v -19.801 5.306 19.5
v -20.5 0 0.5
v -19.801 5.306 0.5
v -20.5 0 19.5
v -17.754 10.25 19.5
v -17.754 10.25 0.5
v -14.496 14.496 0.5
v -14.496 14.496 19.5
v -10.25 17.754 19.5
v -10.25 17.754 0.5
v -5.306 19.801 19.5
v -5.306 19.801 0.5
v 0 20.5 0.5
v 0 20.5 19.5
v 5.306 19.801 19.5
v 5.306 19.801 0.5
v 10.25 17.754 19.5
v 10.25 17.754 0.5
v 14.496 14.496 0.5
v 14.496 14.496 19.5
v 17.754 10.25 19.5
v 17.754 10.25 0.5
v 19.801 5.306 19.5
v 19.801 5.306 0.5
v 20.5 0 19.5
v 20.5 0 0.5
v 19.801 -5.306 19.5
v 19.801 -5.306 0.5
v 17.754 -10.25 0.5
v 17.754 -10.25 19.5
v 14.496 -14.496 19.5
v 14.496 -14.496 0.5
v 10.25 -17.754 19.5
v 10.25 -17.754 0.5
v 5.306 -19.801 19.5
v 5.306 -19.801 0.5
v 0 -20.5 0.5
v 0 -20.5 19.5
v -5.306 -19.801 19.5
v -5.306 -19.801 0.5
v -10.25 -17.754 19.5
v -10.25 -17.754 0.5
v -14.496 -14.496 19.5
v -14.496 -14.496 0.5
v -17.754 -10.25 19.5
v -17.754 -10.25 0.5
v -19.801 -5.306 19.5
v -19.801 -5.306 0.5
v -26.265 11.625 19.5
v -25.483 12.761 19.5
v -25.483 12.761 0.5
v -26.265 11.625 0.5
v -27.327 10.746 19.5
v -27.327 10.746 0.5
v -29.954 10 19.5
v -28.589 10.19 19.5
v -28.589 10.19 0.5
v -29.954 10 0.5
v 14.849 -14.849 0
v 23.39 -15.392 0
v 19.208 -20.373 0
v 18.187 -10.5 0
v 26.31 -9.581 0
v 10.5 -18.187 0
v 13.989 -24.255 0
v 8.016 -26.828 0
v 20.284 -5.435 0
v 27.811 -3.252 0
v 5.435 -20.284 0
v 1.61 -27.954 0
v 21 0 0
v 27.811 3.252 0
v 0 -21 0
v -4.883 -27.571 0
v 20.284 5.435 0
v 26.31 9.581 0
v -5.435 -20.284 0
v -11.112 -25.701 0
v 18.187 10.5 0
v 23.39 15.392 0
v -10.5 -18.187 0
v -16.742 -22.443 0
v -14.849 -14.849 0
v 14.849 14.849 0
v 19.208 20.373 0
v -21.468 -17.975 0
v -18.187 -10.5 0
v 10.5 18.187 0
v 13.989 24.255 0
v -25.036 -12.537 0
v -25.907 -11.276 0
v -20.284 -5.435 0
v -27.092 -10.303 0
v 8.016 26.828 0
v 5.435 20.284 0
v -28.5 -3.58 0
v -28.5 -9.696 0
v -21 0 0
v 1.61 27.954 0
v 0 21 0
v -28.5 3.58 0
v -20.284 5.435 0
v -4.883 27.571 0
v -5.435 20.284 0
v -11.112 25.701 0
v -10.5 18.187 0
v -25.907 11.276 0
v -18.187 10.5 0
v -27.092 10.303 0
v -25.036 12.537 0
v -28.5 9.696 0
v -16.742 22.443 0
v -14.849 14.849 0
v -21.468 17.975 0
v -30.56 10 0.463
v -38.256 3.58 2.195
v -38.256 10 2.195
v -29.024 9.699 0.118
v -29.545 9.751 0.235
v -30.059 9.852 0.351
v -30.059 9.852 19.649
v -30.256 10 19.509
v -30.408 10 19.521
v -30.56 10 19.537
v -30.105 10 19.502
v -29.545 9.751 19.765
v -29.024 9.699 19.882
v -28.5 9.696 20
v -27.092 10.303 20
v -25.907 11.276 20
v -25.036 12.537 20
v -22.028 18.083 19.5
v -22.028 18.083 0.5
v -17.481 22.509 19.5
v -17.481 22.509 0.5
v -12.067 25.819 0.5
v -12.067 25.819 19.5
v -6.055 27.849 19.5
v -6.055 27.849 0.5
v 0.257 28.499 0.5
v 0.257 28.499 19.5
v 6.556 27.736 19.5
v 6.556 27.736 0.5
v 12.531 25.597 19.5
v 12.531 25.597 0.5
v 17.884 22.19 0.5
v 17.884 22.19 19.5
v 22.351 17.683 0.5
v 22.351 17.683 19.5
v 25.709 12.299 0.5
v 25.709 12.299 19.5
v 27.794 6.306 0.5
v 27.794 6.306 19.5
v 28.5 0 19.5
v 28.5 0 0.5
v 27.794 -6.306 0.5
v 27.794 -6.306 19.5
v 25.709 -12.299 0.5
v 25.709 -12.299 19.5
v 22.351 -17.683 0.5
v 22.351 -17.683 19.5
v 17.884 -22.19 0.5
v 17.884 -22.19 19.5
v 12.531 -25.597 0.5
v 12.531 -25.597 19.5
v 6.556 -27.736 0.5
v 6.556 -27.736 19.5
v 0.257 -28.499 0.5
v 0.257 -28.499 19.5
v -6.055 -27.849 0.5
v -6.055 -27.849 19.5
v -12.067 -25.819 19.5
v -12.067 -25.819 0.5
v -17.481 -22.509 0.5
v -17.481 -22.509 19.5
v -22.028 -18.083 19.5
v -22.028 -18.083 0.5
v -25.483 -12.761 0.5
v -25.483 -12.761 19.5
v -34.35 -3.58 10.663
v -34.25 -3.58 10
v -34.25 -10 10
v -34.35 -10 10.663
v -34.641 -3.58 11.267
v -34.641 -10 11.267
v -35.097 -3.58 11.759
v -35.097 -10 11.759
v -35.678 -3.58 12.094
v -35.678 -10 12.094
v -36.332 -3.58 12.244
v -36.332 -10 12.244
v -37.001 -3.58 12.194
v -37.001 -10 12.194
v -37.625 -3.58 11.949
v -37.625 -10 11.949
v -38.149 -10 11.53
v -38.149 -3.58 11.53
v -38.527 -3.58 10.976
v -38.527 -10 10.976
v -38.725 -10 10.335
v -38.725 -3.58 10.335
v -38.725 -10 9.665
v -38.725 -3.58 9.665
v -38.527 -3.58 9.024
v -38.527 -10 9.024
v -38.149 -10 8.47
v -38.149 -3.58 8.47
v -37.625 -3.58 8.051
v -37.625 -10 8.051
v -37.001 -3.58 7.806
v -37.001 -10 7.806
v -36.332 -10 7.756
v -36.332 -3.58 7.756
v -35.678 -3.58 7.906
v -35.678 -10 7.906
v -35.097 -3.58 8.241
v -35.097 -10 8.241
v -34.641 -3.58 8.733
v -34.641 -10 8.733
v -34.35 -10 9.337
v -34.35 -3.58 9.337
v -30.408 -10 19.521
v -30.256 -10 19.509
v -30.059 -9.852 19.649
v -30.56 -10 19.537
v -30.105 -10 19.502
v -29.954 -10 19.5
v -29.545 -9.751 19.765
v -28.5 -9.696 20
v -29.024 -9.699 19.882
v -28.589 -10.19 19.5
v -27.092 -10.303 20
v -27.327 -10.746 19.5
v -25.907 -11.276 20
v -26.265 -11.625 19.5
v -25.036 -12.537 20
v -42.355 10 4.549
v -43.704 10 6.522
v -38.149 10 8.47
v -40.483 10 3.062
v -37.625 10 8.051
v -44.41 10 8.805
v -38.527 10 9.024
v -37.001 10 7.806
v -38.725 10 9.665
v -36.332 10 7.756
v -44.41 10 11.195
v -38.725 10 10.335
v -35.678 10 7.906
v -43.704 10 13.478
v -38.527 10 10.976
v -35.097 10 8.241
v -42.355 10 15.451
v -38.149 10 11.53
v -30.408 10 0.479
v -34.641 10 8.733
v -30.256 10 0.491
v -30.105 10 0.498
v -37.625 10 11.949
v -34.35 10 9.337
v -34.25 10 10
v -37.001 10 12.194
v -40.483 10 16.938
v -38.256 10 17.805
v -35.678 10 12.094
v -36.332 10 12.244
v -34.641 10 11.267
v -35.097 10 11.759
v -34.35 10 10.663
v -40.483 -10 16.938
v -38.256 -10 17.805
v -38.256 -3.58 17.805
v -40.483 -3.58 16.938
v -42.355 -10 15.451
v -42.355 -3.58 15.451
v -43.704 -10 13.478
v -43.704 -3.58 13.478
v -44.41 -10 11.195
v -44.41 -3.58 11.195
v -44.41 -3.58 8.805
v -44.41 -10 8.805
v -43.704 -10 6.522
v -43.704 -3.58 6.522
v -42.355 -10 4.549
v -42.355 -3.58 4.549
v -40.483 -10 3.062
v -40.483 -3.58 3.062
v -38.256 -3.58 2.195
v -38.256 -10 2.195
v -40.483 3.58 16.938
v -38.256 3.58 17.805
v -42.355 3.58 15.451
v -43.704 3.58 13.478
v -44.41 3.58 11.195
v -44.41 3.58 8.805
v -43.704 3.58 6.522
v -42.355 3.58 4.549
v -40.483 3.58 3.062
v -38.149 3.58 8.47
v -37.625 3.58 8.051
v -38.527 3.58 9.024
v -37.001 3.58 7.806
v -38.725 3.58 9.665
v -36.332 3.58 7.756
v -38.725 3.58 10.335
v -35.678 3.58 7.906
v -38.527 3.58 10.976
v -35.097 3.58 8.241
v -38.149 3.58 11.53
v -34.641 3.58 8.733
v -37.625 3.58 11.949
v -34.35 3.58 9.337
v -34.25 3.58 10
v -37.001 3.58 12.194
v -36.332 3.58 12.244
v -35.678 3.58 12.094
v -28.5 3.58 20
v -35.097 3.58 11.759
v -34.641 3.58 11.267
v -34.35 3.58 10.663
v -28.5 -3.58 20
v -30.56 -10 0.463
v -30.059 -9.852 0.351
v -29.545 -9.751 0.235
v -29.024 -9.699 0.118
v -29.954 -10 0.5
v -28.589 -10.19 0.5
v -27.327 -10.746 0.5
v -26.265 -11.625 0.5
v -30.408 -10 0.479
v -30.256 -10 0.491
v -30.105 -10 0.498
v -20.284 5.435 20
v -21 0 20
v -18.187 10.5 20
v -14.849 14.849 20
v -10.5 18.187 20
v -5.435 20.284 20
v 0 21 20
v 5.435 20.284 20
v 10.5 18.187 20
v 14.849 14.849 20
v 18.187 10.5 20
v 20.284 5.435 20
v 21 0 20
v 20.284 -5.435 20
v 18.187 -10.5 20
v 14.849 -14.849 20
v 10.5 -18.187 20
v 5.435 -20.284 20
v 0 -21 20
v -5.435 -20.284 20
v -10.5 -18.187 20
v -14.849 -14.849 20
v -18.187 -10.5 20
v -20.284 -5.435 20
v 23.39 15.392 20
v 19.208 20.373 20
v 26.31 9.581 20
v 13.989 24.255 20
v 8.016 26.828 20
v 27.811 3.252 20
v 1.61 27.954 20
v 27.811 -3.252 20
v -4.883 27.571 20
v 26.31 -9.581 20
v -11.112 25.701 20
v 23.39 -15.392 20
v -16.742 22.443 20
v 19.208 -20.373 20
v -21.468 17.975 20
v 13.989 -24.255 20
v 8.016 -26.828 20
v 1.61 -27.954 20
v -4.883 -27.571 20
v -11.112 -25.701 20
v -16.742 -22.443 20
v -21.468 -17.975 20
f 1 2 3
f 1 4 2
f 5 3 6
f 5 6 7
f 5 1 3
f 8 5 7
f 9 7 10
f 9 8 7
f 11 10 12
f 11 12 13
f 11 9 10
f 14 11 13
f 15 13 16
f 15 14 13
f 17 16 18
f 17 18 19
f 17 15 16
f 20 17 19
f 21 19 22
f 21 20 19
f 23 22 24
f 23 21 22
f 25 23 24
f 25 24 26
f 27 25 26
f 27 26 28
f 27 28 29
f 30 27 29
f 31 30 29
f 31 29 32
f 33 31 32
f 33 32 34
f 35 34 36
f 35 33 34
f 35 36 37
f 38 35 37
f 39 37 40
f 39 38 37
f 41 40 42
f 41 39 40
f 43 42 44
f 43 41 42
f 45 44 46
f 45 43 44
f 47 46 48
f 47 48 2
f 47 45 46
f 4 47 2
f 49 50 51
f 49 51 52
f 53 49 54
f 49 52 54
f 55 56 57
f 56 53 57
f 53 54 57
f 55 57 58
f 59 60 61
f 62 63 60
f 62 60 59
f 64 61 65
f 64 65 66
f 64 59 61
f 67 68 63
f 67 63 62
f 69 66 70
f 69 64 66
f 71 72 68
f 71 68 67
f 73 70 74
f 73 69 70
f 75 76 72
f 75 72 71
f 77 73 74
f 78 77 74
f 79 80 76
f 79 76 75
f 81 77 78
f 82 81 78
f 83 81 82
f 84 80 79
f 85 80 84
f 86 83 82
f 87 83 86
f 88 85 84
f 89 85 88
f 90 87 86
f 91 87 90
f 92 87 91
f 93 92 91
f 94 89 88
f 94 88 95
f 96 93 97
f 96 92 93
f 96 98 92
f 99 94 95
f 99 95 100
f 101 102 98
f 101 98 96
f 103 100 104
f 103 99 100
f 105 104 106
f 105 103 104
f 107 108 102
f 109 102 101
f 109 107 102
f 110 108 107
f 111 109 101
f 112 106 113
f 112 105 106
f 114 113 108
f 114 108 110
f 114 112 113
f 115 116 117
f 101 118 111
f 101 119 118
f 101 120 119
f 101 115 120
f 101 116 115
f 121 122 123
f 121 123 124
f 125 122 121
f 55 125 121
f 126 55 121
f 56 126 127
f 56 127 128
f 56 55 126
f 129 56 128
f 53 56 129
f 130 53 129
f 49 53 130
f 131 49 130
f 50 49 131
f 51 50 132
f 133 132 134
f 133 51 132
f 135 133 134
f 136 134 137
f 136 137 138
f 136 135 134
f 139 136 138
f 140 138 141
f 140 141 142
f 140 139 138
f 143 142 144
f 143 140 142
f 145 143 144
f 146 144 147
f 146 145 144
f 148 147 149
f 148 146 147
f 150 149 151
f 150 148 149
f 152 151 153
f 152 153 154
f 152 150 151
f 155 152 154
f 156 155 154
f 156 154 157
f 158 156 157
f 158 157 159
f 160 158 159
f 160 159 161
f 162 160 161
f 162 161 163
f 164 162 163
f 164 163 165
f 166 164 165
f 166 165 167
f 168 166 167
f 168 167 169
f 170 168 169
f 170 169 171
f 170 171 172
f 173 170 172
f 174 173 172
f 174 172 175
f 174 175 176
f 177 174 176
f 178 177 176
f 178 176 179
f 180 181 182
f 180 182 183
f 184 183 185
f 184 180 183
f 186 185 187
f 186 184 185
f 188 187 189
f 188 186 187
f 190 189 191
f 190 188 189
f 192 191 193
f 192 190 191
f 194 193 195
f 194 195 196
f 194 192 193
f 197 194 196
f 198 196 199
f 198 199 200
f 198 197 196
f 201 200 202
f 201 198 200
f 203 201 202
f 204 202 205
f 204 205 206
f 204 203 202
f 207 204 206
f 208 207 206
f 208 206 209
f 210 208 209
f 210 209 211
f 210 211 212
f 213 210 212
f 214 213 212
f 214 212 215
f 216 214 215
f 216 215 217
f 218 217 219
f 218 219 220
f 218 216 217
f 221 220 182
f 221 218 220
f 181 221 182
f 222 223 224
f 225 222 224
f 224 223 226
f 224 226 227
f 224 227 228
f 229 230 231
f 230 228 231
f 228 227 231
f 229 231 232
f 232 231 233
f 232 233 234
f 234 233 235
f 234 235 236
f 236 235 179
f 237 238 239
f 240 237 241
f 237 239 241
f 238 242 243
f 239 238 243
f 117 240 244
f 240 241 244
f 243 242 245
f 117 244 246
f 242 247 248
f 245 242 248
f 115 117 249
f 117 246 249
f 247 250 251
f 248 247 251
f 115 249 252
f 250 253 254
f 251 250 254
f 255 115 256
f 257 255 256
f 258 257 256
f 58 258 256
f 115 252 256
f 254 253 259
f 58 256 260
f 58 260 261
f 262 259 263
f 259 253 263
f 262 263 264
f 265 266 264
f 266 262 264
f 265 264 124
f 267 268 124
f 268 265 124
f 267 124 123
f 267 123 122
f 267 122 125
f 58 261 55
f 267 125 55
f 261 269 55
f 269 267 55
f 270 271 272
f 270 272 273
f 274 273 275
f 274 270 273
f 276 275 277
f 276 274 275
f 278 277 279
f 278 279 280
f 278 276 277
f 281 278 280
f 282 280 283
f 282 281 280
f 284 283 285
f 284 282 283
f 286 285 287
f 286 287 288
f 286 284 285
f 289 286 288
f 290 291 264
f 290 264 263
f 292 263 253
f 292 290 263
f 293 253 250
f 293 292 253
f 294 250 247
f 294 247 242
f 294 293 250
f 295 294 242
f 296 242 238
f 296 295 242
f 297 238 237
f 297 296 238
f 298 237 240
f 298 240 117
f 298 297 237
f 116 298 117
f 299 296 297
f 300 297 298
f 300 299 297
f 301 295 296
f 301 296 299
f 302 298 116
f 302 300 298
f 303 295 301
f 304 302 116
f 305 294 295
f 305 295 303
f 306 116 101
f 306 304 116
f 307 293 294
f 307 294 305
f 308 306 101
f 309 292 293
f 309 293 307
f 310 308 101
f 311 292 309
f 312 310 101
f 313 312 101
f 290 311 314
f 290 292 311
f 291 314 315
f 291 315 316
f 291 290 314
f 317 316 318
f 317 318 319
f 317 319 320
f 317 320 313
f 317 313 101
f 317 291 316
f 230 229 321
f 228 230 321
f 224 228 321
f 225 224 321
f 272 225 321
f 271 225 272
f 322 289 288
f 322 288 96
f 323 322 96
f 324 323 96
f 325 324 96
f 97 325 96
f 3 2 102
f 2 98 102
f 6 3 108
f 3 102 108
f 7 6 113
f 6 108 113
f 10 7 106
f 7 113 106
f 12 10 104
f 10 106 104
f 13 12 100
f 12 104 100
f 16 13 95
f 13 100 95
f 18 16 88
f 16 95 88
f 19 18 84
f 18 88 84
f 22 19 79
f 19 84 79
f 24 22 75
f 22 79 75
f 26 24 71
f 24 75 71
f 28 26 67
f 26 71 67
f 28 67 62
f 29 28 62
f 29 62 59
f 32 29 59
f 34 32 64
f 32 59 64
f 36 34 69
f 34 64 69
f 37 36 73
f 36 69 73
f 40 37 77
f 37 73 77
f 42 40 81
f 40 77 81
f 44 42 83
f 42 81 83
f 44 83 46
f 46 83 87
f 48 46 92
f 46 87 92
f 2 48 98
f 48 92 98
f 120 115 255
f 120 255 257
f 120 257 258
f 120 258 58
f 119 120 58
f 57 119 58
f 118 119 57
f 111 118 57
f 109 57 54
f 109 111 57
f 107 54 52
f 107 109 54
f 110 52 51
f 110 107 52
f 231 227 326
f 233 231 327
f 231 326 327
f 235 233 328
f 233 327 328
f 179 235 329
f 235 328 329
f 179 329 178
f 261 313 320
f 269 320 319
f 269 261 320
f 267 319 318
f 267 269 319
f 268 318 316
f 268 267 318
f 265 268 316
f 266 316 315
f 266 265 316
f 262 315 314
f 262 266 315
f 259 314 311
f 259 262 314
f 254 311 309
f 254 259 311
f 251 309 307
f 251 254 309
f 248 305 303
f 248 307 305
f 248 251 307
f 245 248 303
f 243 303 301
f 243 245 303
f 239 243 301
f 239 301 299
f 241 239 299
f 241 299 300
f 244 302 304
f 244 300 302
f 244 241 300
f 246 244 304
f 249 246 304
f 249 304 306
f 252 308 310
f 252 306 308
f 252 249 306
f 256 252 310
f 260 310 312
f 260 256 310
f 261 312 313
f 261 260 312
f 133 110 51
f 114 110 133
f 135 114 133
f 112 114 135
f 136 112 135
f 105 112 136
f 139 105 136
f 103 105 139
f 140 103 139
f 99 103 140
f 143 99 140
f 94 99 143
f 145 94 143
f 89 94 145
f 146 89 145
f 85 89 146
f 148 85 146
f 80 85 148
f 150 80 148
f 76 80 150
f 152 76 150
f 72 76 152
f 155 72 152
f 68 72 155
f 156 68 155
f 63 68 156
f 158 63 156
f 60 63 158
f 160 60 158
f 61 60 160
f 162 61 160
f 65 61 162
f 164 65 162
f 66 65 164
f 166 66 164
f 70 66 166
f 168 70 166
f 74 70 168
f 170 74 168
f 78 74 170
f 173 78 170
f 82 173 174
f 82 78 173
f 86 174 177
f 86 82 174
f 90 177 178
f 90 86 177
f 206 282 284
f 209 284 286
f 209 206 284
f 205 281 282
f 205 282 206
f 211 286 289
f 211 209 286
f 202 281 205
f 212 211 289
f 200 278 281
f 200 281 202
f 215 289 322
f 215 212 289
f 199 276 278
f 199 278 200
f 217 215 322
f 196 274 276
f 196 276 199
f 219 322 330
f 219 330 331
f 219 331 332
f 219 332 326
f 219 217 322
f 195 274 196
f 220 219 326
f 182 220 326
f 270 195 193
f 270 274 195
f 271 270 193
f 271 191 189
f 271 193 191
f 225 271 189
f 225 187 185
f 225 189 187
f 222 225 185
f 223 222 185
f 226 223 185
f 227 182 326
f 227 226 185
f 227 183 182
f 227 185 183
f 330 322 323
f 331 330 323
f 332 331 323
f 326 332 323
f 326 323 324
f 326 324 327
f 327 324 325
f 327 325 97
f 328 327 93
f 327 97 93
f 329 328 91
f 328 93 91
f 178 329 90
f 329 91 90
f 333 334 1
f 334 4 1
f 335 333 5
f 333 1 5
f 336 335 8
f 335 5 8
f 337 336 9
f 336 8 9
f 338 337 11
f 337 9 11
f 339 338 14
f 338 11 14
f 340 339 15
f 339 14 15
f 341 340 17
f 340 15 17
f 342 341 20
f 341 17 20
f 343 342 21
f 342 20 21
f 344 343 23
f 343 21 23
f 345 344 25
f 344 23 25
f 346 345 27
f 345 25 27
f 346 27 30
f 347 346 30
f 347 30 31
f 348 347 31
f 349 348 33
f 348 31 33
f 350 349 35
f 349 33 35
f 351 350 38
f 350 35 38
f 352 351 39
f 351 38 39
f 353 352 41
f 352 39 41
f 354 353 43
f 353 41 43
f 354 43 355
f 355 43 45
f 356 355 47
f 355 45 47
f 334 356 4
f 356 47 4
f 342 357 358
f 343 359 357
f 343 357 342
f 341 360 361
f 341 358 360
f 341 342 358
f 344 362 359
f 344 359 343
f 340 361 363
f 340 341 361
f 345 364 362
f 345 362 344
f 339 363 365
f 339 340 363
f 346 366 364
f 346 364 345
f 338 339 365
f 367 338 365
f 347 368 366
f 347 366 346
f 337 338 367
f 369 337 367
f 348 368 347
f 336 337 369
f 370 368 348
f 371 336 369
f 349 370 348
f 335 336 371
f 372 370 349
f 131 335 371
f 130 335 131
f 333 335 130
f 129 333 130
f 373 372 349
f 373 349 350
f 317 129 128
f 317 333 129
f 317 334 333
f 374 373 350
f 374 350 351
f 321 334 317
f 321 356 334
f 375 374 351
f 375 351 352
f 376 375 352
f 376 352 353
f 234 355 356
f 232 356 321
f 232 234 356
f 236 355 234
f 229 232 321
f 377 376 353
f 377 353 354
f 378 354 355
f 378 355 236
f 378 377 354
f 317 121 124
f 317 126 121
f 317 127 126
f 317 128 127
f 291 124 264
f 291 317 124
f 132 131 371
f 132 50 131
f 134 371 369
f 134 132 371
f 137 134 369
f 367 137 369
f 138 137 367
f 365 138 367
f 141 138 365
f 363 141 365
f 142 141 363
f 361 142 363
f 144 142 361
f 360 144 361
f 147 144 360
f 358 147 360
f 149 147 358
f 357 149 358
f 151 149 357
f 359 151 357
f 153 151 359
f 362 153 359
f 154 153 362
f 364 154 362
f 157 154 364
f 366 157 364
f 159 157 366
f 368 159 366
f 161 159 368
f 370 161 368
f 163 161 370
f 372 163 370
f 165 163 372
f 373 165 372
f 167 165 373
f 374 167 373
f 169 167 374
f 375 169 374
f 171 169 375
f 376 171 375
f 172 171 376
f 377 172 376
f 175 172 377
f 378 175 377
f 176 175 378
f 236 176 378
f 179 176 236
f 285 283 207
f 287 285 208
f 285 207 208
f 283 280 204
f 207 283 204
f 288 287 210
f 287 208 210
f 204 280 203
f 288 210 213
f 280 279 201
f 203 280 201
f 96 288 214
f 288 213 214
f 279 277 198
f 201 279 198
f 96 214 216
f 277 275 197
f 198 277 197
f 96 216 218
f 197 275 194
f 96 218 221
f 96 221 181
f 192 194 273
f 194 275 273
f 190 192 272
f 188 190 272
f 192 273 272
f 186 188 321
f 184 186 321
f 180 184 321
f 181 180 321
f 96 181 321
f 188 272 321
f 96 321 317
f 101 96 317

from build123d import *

# Parameters (mm, degrees)
F0_R         = 2.25
F2_DEPTH     = 10
F3_W         = 16
F3_H         = 7.16
F4_DEPTH     = 20.001
F5_R         = 5
F6_T2_ANGLE  = 306.799730078
F6_T4_ANGLE  = 306.799730078
F6_T10_ANGLE = 90.7011440301
F6_T12_ANGLE = 90.7011440301
F6_T14_ANGLE = 90.7011440301
F6_T16_ANGLE = 90.7011440301


# Not quite as in the source:
# - a fillet or chamfer that OpenCascade refuses, or shapes differently, is made with other operations: its cross-section is extruded or revolved along the edge and cut away or added


with BuildPart() as f1:
    # F0 (on Front) → F1 (revolve)
    with BuildSketch(Plane.XZ):
        Polygon((-20.5, 0), (-20.5, 20), (-28.5, 20), (-28.5, 10), (-28.5, 0), align=None)
    revolve(axis=Axis((0, 0, 23.8705657878), (0, 0, -1)))

    # F0 (on Front) → F2 (join, symmetric)
    with BuildSketch(Plane.XZ):
        Polygon((-20.5, 0), (-20.5, 20), (-28.5, 20), (-28.5, 10), (-28.5, 0), align=None)
        with BuildLine():
            Line((-28.5, 10), (-28.5, 20))
            Line((-28.5, 20), (-38.256097561, 17.8048780488))
            ThreePointArc((-38.256097561, 17.8048780488), (-31.5024396196, 16.2469504755), (-28.5, 10))
        make_face()
        with BuildLine():
            Line((-38.256097561, 2.1951219512), (-28.5, 0))
            Line((-28.5, 0), (-28.5, 10))
            ThreePointArc((-28.5, 10), (-31.5024396196, 3.7530495245), (-38.256097561, 2.1951219512))
        make_face()
        with BuildLine():
            ThreePointArc((-38.256097561, 2.1951219512), (-31.5024396196, 3.7530495245), (-28.5, 10))
            ThreePointArc((-28.5, 10), (-31.5024396196, 16.2469504755), (-38.256097561, 17.8048780488))
            ThreePointArc((-38.256097561, 17.8048780488), (-44.5, 10), (-38.256097561, 2.1951219512))
        make_face()
        with Locations((-36.5, 10)):
            Circle(F0_R, mode=Mode.SUBTRACT)
    extrude(amount=F2_DEPTH, both=True)

    # F3 (on face) → F4 (cut, through all)
    with BuildSketch(Plane.XY.offset(20)):
        with Locations((-36.5, 0)):
            Rectangle(F3_W, F3_H)
    extrude(amount=-F4_DEPTH, mode=Mode.SUBTRACT)

    # F5
    f5_edges = [f1.edges().sort_by_distance(p)[0] for p in [
        (-26.688012, 10, 10),
        (-26.688012, -10, 10),
    ]]
    fillet(f5_edges, radius=F5_R)

    # F6: chamfer of 0.5 on 8 edges, made by hand

    # F6_s1 → F6_t2 (revolve, cut)
    with BuildSketch(Plane(origin=(0, 0, 0), x_dir=(0, 0, 1), z_dir=(-0.447761194, -0.8941531821, 0))):
        Polygon((0.5, 28.5), (0, 28), (0, 28.5), align=None)
    revolve(axis=Axis((0, 0, 0), (0, 0, -1)), revolution_arc=F6_T2_ANGLE, mode=Mode.SUBTRACT)

    # F6_s3 → F6_t4 (revolve, cut)
    with BuildSketch(Plane(origin=(0, 0, 0), x_dir=(0, 0, 1), z_dir=(-0.447761194, -0.8941531821, 0))):
        Polygon((20, 28), (19.5, 28.5), (20, 28.5), align=None)
    revolve(axis=Axis((0, 0, 20), (0, 0, -1)), revolution_arc=F6_T4_ANGLE, mode=Mode.SUBTRACT)

    # F6_s5 → F6_t6 (revolve, cut)
    with BuildSketch(Plane.XZ):
        Polygon((-21, 20), (-20.5, 19.5), (-20.5, 20), align=None)
    revolve(axis=Axis((0, 0, 20), (0, 0, -1)), mode=Mode.SUBTRACT)

    # F6_s7 → F6_t8 (revolve, cut)
    with BuildSketch(Plane.XZ):
        Polygon((-20.5, 0.5), (-21, 0), (-20.5, 0), align=None)
    revolve(axis=Axis((0, 0, 0), (0, 0, -1)), mode=Mode.SUBTRACT)

    # F6_s9 → F6_t10 (revolve, cut)
    with BuildSketch(Plane(origin=(-29.7661054166, 15.3642741077, 0), x_dir=(0, 0, 1), z_dir=(-0.8886069942, 0.4586693906, 0))):
        Polygon((20, -5.9099383756), (19.5, -5.4099383756), (20, -5.4099383756), align=None)
    revolve(axis=Axis((-29.9541316015, 15, 20), (0, 0, 1)), revolution_arc=F6_T10_ANGLE, mode=Mode.SUBTRACT)

    # F6_s11 → F6_t12 (revolve, cut)
    with BuildSketch(Plane(origin=(-29.7661054166, -15.3642741077, 0), x_dir=(0, 0, 1), z_dir=(-0.8886069942, -0.4586693906, 0))):
        Polygon((20, 5.9099383756), (19.5, 5.4099383756), (20, 5.4099383756), align=None)
    revolve(axis=Axis((-29.9541316015, -15, 20), (0, 0, -1)), revolution_arc=F6_T12_ANGLE, mode=Mode.SUBTRACT)

    # F6_s13 → F6_t14 (revolve, cut)
    with BuildSketch(Plane(origin=(-29.7661054166, 15.3642741077, 0), x_dir=(0, 0, 1), z_dir=(-0.8886069942, 0.4586693906, 0))):
        Polygon((0.5, -5.4099383756), (0, -5.9099383756), (0, -5.4099383756), align=None)
    revolve(axis=Axis((-29.9541316015, 15, 0), (0, 0, 1)), revolution_arc=F6_T14_ANGLE, mode=Mode.SUBTRACT)

    # F6_s15 → F6_t16 (revolve, cut)
    with BuildSketch(Plane(origin=(-29.7661054166, -15.3642741077, 0), x_dir=(0, 0, 1), z_dir=(-0.8886069942, -0.4586693906, 0))):
        Polygon((0.5, 5.4099383756), (0, 5.9099383756), (0, 5.4099383756), align=None)
    revolve(axis=Axis((-29.9541316015, -15, 0), (0, 0, -1)), revolution_arc=F6_T16_ANGLE, mode=Mode.SUBTRACT)


solid = f1.part
